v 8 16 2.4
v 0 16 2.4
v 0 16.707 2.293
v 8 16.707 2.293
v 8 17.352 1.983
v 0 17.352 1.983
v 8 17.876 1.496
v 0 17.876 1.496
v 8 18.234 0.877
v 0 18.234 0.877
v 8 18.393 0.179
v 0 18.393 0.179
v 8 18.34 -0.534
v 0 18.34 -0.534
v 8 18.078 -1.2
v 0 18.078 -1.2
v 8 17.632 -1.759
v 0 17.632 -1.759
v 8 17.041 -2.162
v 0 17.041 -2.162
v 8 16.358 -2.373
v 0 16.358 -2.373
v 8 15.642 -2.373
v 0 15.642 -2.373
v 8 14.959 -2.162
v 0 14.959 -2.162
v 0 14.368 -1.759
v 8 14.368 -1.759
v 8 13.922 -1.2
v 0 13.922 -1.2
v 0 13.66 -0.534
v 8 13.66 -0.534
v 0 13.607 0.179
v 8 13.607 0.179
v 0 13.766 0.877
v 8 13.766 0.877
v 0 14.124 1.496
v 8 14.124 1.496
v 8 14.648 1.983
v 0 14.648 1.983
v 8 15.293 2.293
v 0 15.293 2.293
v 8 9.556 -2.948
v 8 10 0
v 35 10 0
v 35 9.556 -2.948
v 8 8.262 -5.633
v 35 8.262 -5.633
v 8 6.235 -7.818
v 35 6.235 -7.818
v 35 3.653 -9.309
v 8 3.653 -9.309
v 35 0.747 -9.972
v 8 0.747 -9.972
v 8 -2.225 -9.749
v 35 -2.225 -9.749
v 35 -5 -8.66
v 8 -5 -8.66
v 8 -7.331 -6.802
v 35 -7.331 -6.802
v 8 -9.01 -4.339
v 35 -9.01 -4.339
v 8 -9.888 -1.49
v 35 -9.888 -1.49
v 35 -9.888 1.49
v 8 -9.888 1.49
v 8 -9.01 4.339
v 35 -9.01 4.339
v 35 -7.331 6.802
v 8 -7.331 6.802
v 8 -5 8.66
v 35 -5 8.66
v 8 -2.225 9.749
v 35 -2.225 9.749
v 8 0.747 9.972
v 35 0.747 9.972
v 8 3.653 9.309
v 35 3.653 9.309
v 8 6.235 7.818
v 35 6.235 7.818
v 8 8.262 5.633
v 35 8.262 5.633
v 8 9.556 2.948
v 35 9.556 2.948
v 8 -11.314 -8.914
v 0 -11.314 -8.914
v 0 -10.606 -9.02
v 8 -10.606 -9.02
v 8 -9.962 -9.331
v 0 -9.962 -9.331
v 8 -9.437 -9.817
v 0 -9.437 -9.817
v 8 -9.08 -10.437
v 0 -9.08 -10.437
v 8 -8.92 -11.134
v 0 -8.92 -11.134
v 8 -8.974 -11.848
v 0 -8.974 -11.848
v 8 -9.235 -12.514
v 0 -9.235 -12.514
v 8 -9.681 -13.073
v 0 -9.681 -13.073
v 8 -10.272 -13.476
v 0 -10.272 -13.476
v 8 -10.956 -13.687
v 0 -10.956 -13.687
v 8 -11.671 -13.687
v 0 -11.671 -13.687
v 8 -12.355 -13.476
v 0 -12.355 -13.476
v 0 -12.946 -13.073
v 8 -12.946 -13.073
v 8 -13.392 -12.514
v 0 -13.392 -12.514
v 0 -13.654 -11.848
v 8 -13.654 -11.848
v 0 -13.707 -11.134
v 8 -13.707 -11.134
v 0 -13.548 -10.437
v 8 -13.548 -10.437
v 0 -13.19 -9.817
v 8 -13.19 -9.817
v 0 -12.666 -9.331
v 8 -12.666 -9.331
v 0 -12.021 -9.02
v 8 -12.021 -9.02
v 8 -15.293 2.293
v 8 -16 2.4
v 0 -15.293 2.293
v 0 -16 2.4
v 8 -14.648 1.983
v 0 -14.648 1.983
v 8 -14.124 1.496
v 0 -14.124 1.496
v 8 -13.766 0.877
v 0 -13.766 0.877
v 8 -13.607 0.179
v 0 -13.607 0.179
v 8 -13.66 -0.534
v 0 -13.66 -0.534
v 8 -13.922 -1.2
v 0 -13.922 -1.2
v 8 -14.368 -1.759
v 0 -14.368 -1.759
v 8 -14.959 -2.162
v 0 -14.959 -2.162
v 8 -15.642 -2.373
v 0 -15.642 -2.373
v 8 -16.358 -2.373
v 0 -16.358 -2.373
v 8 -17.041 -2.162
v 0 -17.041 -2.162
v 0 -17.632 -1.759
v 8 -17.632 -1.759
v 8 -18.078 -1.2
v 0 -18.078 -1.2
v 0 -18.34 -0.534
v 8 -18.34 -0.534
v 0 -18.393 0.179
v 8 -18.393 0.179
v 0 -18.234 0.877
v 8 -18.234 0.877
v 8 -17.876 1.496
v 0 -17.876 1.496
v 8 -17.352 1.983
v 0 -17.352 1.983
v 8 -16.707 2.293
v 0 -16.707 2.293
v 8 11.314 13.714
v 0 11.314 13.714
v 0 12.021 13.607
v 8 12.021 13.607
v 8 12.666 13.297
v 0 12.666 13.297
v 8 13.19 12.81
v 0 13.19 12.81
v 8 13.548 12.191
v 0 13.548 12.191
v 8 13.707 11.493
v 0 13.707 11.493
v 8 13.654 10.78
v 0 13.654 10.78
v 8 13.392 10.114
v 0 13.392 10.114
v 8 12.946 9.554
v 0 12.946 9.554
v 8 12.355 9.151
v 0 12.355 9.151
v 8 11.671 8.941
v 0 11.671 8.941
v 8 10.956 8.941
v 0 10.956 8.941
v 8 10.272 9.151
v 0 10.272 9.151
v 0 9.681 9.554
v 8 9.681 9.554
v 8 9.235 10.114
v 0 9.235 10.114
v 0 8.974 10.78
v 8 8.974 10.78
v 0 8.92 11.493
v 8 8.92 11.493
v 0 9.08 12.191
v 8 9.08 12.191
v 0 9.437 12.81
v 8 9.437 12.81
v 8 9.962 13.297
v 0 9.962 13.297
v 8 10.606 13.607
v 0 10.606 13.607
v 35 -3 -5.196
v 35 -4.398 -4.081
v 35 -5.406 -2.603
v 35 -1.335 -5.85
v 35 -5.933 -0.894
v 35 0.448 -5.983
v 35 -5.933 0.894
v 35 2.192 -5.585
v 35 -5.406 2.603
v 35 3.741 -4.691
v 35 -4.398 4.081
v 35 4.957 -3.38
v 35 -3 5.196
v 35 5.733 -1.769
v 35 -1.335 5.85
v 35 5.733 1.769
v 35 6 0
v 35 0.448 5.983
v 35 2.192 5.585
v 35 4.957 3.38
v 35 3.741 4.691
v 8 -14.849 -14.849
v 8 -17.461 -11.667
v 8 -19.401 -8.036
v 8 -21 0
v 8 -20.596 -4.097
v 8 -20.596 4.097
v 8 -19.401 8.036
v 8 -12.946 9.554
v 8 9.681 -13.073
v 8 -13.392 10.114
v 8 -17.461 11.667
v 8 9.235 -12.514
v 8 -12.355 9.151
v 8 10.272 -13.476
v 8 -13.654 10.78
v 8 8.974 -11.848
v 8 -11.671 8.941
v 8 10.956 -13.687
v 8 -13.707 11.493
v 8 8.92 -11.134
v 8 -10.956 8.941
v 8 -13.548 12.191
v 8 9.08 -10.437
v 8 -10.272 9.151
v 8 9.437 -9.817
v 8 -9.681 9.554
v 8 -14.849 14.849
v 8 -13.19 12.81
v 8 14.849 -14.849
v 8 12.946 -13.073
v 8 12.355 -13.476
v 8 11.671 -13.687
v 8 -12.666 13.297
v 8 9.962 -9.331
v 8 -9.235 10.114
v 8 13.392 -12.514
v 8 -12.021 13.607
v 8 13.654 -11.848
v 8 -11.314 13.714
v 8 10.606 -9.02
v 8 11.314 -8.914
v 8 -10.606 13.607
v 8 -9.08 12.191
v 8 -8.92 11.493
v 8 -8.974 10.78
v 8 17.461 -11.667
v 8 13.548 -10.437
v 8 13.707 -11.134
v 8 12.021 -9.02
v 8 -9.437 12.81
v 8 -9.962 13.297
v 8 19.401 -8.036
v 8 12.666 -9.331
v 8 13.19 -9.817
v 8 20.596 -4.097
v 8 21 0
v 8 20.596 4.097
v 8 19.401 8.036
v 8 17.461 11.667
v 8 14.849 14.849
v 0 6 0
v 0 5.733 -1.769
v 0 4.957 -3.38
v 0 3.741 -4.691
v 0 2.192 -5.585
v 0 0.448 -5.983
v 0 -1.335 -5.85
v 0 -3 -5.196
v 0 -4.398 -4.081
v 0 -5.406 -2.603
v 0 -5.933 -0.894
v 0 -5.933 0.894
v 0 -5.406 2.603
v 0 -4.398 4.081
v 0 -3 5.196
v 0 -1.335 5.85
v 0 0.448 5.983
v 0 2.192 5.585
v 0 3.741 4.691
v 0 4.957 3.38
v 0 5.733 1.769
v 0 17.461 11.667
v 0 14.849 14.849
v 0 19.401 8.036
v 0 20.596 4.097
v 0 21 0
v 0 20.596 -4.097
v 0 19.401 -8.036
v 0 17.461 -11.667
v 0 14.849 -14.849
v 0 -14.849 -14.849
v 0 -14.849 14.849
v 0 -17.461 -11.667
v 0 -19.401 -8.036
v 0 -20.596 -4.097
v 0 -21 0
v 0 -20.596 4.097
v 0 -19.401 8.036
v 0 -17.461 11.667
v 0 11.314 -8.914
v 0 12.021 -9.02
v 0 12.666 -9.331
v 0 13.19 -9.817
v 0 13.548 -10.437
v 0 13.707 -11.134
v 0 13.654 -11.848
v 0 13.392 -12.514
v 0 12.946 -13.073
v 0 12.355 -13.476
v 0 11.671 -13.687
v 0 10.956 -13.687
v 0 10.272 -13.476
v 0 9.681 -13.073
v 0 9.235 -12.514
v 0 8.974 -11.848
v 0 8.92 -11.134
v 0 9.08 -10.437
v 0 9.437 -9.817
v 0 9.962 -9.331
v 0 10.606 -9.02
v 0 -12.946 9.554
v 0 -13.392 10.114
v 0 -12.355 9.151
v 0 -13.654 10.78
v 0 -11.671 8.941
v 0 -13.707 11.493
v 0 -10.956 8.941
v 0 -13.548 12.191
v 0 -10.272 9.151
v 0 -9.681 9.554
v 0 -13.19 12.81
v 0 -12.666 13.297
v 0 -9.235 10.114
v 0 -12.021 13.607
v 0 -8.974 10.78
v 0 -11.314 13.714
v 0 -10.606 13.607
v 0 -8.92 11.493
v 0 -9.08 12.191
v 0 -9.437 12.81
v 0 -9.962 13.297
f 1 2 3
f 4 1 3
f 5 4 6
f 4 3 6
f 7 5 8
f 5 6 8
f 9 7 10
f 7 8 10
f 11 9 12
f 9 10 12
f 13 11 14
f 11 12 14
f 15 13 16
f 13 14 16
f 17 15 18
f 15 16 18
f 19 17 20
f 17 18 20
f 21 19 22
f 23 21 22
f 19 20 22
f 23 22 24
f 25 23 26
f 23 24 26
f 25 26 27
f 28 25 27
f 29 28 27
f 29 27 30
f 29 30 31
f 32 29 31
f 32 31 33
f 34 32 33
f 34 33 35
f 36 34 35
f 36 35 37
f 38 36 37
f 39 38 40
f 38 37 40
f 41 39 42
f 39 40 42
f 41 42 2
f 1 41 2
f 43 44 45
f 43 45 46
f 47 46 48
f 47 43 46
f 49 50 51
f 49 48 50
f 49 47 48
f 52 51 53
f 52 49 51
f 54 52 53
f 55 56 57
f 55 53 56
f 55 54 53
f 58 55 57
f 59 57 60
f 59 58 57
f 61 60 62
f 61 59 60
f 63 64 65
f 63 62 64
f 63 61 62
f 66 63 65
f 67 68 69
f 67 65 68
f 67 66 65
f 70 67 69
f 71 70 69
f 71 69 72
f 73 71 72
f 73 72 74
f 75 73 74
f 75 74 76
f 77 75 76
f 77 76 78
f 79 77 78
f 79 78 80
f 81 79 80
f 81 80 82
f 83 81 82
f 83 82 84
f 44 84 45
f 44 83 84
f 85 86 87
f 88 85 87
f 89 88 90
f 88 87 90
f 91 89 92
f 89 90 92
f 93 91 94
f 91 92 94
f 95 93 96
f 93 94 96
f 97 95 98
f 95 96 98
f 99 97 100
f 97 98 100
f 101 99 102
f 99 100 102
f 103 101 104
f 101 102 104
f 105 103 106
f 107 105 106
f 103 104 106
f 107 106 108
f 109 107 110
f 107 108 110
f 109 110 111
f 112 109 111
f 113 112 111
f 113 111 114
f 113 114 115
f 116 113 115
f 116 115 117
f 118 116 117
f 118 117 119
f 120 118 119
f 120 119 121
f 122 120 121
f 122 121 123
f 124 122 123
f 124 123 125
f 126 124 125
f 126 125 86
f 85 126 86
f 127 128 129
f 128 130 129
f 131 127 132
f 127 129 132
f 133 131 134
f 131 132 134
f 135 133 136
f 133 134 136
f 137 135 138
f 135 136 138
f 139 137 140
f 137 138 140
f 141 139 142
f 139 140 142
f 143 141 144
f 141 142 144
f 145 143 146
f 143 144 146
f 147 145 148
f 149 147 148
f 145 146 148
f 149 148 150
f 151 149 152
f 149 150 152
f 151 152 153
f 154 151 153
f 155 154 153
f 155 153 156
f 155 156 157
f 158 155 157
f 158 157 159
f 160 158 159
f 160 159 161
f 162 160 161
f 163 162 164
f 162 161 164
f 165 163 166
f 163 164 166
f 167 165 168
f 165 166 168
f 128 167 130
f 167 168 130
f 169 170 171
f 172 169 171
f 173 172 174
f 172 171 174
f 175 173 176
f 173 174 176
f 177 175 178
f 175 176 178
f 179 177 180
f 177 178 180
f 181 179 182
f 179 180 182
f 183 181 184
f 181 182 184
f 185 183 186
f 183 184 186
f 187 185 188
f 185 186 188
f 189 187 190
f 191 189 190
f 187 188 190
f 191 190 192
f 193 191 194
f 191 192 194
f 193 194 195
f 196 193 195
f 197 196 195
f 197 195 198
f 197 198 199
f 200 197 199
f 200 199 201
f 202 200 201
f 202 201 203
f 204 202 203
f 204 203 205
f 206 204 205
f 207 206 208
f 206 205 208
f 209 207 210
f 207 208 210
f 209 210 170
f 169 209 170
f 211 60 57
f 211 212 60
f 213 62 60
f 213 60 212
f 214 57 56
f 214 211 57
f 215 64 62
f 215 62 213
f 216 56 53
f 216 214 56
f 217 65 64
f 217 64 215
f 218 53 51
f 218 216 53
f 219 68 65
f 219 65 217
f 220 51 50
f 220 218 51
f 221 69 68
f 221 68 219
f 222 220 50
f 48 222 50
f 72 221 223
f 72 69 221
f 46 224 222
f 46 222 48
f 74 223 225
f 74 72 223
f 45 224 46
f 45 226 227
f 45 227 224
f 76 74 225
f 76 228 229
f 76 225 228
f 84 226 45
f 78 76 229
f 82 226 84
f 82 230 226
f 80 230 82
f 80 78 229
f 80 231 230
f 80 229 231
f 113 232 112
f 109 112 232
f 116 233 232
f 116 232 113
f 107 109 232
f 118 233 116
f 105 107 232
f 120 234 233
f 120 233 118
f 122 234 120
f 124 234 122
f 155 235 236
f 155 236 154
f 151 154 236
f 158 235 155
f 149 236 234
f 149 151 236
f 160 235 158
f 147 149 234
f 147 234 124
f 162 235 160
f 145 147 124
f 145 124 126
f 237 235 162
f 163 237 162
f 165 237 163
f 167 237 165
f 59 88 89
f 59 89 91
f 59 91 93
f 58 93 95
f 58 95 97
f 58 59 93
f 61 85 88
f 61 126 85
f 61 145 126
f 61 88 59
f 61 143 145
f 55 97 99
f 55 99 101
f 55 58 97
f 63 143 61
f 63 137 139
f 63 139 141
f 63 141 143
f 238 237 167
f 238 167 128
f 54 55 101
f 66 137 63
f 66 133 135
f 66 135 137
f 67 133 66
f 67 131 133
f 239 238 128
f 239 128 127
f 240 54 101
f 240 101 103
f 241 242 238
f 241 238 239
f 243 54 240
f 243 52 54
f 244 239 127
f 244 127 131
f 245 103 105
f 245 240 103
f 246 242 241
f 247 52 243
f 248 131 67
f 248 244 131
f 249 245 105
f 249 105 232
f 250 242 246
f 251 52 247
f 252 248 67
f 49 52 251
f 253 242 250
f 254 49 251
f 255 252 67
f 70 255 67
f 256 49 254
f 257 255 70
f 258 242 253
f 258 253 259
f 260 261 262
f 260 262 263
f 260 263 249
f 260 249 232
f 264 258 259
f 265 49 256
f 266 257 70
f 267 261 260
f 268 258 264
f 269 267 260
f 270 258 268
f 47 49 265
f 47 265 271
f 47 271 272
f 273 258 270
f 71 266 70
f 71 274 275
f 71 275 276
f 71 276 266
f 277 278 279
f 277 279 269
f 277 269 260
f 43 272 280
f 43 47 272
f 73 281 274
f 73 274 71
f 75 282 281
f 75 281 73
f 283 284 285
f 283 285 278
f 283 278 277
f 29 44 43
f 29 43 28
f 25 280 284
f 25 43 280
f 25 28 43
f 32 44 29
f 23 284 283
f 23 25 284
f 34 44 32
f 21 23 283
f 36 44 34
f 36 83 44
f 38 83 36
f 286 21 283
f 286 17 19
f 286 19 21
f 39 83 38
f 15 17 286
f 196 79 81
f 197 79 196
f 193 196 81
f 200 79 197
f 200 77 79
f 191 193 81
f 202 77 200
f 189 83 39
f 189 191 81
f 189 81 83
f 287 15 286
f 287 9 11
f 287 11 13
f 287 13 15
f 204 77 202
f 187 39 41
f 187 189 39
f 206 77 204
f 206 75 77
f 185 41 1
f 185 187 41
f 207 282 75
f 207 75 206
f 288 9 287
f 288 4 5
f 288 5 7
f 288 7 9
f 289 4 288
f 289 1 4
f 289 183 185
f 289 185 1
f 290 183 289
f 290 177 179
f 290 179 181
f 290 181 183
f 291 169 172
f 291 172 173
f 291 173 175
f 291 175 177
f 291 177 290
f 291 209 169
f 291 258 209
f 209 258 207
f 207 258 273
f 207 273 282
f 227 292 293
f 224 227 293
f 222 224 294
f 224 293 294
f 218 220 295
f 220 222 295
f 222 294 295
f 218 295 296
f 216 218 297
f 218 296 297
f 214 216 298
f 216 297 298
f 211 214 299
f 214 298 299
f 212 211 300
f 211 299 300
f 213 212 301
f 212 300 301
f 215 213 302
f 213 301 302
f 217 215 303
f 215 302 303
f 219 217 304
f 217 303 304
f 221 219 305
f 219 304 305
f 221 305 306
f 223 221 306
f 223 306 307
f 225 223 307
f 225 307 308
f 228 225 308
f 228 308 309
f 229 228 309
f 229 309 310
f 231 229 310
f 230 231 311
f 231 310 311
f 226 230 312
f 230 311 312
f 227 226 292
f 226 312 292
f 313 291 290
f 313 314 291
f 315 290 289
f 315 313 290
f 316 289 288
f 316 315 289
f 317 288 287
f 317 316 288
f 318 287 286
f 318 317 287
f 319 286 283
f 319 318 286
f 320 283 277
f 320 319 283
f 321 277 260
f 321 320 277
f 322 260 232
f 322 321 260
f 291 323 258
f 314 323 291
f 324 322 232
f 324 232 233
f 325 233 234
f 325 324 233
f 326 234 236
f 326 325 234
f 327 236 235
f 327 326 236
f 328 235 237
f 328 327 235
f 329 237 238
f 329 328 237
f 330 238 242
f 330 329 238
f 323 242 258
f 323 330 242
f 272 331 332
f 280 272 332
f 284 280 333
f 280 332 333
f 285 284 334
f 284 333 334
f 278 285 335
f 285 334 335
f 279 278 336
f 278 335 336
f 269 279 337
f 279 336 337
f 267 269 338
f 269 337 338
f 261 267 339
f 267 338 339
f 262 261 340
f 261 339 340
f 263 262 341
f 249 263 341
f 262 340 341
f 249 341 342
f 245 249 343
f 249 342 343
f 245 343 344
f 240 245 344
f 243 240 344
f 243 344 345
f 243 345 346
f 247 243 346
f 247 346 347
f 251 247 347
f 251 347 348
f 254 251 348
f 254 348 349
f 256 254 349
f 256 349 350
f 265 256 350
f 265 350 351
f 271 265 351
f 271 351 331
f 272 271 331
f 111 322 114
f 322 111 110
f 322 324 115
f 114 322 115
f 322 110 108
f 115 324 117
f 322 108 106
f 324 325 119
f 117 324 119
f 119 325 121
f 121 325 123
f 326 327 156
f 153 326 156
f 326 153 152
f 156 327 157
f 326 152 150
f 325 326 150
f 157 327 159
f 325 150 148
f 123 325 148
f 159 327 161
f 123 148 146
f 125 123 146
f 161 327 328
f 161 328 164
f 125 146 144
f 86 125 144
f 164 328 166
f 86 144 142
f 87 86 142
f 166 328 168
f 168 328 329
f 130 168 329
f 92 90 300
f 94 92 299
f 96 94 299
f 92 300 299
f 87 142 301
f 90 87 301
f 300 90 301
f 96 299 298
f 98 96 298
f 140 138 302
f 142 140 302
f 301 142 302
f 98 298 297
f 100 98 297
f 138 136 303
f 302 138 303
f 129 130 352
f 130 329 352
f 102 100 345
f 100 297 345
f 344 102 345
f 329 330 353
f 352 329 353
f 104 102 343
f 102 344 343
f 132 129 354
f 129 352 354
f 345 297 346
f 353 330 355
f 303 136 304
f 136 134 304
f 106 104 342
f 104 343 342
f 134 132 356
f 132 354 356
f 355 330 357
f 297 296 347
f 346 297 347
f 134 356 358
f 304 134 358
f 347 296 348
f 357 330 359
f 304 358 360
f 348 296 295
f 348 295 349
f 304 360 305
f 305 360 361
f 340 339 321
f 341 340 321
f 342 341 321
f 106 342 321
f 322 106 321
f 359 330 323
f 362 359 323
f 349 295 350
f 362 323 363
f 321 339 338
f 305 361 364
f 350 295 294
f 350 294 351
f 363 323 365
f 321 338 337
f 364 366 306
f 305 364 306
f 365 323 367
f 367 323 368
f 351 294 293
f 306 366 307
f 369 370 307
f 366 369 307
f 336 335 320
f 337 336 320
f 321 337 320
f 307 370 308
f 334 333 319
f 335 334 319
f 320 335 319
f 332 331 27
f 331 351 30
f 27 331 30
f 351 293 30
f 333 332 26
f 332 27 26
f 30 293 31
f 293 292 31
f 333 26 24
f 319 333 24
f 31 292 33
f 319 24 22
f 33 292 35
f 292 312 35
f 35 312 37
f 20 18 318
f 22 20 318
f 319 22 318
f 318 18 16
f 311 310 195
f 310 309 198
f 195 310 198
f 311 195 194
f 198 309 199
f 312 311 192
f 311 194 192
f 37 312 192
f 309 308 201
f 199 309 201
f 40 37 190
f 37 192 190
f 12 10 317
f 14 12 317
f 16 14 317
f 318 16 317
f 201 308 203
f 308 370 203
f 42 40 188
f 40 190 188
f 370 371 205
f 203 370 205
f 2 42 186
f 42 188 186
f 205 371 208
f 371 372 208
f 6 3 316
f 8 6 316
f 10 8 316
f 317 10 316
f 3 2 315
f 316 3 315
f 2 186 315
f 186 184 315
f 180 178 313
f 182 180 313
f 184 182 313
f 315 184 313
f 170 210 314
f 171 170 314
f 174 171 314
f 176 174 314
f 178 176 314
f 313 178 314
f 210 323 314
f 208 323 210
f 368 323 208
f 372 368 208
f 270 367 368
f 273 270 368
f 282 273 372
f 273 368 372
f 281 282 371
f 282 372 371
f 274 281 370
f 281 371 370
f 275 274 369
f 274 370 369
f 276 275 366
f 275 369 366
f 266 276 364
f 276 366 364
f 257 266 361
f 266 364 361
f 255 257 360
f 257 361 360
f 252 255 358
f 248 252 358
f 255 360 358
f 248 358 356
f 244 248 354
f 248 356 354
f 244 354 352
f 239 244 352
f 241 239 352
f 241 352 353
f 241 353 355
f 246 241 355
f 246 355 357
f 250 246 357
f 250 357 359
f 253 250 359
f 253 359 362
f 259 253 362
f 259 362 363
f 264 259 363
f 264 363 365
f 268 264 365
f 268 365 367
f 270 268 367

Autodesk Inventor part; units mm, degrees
ref_plane "YZ Plane" through (0, 0, 0) normal (1, 0, 0) x (0, 1, 0)
ref_plane "XZ Plane" through (0, 0, 0) normal (0, 1, 0) x (-1, 0, 0)
ref_plane "XY Plane" through (0, 0, 0) normal (0, 0, 1) x (1, 0, 0)
sketch "Sketch1" plane through (0, 0, 0) normal (0, 0, 1) x (1, 0, 0)
  line L0 (0, 21) -> (0, 6)
  line L1 (0, 0) -> (35, 0) construction
  line L2 (35, 0) -> (35, 6) construction
  line L3 (35, 10) -> (8, 10)
  line L4 (8, 10) -> (8, 21)
  line L5 (8, 21) -> (0, 21)
  line L6 (35, 6) -> (0, 6)
  line L7 (0, 6) -> (0, 0) construction
  line L8 (35, 6) -> (35, 10)
  dimension "d0" = 10
  dimension "d1" = 21
  dimension "d2" = 8
  dimension "d3" = 35
  dimension "d4" = 6
revolve "Revolution1" add sketch "Sketch1" angle 360 about axis through (0, 0, 0) along (1, 0, 0)
sketch "Sketch2" plane through (0, 0, 0) normal (-1, 0, 0) x (0, 0, 1)
  circle A0 centre (0, 0) radius 21 projected
  circle A1 centre (0, 0) radius 21 projected
  line L0 (-14.8492, 14.8492) -> (-14.8492, -14.8492)
  line L1 (14.8492, -14.8492) -> (14.8492, 14.8492)
  line L2 (0, 0) -> (14.8492, 14.8492) construction
  circle A2 centre (0, 16) radius 2.4
  circle A3 centre (11.3137, 11.3137) radius 2.4
  circle A4 centre (11.3137, -11.3137) radius 2.4
  circle A5 centre (0, 0) radius 16 construction
  circle A6 centre (-11.3137, 11.3137) radius 2.4
  circle A7 centre (0, -16) radius 2.4
  circle A8 centre (-11.3137, -11.3137) radius 2.4
  point P0 (-14.8492, -14.8492)
  dimension "d6" = 45
  dimension "d7" = 32
  dimension "d8" = 4.8
extrude "Extrusion1" cut sketch "Sketch2" against normal blind 10 contours A0 L1 | L0 A0 | A2 | A3 | A4 | A6 | A7 | A8
properties part number "SFU1204-Housing"
